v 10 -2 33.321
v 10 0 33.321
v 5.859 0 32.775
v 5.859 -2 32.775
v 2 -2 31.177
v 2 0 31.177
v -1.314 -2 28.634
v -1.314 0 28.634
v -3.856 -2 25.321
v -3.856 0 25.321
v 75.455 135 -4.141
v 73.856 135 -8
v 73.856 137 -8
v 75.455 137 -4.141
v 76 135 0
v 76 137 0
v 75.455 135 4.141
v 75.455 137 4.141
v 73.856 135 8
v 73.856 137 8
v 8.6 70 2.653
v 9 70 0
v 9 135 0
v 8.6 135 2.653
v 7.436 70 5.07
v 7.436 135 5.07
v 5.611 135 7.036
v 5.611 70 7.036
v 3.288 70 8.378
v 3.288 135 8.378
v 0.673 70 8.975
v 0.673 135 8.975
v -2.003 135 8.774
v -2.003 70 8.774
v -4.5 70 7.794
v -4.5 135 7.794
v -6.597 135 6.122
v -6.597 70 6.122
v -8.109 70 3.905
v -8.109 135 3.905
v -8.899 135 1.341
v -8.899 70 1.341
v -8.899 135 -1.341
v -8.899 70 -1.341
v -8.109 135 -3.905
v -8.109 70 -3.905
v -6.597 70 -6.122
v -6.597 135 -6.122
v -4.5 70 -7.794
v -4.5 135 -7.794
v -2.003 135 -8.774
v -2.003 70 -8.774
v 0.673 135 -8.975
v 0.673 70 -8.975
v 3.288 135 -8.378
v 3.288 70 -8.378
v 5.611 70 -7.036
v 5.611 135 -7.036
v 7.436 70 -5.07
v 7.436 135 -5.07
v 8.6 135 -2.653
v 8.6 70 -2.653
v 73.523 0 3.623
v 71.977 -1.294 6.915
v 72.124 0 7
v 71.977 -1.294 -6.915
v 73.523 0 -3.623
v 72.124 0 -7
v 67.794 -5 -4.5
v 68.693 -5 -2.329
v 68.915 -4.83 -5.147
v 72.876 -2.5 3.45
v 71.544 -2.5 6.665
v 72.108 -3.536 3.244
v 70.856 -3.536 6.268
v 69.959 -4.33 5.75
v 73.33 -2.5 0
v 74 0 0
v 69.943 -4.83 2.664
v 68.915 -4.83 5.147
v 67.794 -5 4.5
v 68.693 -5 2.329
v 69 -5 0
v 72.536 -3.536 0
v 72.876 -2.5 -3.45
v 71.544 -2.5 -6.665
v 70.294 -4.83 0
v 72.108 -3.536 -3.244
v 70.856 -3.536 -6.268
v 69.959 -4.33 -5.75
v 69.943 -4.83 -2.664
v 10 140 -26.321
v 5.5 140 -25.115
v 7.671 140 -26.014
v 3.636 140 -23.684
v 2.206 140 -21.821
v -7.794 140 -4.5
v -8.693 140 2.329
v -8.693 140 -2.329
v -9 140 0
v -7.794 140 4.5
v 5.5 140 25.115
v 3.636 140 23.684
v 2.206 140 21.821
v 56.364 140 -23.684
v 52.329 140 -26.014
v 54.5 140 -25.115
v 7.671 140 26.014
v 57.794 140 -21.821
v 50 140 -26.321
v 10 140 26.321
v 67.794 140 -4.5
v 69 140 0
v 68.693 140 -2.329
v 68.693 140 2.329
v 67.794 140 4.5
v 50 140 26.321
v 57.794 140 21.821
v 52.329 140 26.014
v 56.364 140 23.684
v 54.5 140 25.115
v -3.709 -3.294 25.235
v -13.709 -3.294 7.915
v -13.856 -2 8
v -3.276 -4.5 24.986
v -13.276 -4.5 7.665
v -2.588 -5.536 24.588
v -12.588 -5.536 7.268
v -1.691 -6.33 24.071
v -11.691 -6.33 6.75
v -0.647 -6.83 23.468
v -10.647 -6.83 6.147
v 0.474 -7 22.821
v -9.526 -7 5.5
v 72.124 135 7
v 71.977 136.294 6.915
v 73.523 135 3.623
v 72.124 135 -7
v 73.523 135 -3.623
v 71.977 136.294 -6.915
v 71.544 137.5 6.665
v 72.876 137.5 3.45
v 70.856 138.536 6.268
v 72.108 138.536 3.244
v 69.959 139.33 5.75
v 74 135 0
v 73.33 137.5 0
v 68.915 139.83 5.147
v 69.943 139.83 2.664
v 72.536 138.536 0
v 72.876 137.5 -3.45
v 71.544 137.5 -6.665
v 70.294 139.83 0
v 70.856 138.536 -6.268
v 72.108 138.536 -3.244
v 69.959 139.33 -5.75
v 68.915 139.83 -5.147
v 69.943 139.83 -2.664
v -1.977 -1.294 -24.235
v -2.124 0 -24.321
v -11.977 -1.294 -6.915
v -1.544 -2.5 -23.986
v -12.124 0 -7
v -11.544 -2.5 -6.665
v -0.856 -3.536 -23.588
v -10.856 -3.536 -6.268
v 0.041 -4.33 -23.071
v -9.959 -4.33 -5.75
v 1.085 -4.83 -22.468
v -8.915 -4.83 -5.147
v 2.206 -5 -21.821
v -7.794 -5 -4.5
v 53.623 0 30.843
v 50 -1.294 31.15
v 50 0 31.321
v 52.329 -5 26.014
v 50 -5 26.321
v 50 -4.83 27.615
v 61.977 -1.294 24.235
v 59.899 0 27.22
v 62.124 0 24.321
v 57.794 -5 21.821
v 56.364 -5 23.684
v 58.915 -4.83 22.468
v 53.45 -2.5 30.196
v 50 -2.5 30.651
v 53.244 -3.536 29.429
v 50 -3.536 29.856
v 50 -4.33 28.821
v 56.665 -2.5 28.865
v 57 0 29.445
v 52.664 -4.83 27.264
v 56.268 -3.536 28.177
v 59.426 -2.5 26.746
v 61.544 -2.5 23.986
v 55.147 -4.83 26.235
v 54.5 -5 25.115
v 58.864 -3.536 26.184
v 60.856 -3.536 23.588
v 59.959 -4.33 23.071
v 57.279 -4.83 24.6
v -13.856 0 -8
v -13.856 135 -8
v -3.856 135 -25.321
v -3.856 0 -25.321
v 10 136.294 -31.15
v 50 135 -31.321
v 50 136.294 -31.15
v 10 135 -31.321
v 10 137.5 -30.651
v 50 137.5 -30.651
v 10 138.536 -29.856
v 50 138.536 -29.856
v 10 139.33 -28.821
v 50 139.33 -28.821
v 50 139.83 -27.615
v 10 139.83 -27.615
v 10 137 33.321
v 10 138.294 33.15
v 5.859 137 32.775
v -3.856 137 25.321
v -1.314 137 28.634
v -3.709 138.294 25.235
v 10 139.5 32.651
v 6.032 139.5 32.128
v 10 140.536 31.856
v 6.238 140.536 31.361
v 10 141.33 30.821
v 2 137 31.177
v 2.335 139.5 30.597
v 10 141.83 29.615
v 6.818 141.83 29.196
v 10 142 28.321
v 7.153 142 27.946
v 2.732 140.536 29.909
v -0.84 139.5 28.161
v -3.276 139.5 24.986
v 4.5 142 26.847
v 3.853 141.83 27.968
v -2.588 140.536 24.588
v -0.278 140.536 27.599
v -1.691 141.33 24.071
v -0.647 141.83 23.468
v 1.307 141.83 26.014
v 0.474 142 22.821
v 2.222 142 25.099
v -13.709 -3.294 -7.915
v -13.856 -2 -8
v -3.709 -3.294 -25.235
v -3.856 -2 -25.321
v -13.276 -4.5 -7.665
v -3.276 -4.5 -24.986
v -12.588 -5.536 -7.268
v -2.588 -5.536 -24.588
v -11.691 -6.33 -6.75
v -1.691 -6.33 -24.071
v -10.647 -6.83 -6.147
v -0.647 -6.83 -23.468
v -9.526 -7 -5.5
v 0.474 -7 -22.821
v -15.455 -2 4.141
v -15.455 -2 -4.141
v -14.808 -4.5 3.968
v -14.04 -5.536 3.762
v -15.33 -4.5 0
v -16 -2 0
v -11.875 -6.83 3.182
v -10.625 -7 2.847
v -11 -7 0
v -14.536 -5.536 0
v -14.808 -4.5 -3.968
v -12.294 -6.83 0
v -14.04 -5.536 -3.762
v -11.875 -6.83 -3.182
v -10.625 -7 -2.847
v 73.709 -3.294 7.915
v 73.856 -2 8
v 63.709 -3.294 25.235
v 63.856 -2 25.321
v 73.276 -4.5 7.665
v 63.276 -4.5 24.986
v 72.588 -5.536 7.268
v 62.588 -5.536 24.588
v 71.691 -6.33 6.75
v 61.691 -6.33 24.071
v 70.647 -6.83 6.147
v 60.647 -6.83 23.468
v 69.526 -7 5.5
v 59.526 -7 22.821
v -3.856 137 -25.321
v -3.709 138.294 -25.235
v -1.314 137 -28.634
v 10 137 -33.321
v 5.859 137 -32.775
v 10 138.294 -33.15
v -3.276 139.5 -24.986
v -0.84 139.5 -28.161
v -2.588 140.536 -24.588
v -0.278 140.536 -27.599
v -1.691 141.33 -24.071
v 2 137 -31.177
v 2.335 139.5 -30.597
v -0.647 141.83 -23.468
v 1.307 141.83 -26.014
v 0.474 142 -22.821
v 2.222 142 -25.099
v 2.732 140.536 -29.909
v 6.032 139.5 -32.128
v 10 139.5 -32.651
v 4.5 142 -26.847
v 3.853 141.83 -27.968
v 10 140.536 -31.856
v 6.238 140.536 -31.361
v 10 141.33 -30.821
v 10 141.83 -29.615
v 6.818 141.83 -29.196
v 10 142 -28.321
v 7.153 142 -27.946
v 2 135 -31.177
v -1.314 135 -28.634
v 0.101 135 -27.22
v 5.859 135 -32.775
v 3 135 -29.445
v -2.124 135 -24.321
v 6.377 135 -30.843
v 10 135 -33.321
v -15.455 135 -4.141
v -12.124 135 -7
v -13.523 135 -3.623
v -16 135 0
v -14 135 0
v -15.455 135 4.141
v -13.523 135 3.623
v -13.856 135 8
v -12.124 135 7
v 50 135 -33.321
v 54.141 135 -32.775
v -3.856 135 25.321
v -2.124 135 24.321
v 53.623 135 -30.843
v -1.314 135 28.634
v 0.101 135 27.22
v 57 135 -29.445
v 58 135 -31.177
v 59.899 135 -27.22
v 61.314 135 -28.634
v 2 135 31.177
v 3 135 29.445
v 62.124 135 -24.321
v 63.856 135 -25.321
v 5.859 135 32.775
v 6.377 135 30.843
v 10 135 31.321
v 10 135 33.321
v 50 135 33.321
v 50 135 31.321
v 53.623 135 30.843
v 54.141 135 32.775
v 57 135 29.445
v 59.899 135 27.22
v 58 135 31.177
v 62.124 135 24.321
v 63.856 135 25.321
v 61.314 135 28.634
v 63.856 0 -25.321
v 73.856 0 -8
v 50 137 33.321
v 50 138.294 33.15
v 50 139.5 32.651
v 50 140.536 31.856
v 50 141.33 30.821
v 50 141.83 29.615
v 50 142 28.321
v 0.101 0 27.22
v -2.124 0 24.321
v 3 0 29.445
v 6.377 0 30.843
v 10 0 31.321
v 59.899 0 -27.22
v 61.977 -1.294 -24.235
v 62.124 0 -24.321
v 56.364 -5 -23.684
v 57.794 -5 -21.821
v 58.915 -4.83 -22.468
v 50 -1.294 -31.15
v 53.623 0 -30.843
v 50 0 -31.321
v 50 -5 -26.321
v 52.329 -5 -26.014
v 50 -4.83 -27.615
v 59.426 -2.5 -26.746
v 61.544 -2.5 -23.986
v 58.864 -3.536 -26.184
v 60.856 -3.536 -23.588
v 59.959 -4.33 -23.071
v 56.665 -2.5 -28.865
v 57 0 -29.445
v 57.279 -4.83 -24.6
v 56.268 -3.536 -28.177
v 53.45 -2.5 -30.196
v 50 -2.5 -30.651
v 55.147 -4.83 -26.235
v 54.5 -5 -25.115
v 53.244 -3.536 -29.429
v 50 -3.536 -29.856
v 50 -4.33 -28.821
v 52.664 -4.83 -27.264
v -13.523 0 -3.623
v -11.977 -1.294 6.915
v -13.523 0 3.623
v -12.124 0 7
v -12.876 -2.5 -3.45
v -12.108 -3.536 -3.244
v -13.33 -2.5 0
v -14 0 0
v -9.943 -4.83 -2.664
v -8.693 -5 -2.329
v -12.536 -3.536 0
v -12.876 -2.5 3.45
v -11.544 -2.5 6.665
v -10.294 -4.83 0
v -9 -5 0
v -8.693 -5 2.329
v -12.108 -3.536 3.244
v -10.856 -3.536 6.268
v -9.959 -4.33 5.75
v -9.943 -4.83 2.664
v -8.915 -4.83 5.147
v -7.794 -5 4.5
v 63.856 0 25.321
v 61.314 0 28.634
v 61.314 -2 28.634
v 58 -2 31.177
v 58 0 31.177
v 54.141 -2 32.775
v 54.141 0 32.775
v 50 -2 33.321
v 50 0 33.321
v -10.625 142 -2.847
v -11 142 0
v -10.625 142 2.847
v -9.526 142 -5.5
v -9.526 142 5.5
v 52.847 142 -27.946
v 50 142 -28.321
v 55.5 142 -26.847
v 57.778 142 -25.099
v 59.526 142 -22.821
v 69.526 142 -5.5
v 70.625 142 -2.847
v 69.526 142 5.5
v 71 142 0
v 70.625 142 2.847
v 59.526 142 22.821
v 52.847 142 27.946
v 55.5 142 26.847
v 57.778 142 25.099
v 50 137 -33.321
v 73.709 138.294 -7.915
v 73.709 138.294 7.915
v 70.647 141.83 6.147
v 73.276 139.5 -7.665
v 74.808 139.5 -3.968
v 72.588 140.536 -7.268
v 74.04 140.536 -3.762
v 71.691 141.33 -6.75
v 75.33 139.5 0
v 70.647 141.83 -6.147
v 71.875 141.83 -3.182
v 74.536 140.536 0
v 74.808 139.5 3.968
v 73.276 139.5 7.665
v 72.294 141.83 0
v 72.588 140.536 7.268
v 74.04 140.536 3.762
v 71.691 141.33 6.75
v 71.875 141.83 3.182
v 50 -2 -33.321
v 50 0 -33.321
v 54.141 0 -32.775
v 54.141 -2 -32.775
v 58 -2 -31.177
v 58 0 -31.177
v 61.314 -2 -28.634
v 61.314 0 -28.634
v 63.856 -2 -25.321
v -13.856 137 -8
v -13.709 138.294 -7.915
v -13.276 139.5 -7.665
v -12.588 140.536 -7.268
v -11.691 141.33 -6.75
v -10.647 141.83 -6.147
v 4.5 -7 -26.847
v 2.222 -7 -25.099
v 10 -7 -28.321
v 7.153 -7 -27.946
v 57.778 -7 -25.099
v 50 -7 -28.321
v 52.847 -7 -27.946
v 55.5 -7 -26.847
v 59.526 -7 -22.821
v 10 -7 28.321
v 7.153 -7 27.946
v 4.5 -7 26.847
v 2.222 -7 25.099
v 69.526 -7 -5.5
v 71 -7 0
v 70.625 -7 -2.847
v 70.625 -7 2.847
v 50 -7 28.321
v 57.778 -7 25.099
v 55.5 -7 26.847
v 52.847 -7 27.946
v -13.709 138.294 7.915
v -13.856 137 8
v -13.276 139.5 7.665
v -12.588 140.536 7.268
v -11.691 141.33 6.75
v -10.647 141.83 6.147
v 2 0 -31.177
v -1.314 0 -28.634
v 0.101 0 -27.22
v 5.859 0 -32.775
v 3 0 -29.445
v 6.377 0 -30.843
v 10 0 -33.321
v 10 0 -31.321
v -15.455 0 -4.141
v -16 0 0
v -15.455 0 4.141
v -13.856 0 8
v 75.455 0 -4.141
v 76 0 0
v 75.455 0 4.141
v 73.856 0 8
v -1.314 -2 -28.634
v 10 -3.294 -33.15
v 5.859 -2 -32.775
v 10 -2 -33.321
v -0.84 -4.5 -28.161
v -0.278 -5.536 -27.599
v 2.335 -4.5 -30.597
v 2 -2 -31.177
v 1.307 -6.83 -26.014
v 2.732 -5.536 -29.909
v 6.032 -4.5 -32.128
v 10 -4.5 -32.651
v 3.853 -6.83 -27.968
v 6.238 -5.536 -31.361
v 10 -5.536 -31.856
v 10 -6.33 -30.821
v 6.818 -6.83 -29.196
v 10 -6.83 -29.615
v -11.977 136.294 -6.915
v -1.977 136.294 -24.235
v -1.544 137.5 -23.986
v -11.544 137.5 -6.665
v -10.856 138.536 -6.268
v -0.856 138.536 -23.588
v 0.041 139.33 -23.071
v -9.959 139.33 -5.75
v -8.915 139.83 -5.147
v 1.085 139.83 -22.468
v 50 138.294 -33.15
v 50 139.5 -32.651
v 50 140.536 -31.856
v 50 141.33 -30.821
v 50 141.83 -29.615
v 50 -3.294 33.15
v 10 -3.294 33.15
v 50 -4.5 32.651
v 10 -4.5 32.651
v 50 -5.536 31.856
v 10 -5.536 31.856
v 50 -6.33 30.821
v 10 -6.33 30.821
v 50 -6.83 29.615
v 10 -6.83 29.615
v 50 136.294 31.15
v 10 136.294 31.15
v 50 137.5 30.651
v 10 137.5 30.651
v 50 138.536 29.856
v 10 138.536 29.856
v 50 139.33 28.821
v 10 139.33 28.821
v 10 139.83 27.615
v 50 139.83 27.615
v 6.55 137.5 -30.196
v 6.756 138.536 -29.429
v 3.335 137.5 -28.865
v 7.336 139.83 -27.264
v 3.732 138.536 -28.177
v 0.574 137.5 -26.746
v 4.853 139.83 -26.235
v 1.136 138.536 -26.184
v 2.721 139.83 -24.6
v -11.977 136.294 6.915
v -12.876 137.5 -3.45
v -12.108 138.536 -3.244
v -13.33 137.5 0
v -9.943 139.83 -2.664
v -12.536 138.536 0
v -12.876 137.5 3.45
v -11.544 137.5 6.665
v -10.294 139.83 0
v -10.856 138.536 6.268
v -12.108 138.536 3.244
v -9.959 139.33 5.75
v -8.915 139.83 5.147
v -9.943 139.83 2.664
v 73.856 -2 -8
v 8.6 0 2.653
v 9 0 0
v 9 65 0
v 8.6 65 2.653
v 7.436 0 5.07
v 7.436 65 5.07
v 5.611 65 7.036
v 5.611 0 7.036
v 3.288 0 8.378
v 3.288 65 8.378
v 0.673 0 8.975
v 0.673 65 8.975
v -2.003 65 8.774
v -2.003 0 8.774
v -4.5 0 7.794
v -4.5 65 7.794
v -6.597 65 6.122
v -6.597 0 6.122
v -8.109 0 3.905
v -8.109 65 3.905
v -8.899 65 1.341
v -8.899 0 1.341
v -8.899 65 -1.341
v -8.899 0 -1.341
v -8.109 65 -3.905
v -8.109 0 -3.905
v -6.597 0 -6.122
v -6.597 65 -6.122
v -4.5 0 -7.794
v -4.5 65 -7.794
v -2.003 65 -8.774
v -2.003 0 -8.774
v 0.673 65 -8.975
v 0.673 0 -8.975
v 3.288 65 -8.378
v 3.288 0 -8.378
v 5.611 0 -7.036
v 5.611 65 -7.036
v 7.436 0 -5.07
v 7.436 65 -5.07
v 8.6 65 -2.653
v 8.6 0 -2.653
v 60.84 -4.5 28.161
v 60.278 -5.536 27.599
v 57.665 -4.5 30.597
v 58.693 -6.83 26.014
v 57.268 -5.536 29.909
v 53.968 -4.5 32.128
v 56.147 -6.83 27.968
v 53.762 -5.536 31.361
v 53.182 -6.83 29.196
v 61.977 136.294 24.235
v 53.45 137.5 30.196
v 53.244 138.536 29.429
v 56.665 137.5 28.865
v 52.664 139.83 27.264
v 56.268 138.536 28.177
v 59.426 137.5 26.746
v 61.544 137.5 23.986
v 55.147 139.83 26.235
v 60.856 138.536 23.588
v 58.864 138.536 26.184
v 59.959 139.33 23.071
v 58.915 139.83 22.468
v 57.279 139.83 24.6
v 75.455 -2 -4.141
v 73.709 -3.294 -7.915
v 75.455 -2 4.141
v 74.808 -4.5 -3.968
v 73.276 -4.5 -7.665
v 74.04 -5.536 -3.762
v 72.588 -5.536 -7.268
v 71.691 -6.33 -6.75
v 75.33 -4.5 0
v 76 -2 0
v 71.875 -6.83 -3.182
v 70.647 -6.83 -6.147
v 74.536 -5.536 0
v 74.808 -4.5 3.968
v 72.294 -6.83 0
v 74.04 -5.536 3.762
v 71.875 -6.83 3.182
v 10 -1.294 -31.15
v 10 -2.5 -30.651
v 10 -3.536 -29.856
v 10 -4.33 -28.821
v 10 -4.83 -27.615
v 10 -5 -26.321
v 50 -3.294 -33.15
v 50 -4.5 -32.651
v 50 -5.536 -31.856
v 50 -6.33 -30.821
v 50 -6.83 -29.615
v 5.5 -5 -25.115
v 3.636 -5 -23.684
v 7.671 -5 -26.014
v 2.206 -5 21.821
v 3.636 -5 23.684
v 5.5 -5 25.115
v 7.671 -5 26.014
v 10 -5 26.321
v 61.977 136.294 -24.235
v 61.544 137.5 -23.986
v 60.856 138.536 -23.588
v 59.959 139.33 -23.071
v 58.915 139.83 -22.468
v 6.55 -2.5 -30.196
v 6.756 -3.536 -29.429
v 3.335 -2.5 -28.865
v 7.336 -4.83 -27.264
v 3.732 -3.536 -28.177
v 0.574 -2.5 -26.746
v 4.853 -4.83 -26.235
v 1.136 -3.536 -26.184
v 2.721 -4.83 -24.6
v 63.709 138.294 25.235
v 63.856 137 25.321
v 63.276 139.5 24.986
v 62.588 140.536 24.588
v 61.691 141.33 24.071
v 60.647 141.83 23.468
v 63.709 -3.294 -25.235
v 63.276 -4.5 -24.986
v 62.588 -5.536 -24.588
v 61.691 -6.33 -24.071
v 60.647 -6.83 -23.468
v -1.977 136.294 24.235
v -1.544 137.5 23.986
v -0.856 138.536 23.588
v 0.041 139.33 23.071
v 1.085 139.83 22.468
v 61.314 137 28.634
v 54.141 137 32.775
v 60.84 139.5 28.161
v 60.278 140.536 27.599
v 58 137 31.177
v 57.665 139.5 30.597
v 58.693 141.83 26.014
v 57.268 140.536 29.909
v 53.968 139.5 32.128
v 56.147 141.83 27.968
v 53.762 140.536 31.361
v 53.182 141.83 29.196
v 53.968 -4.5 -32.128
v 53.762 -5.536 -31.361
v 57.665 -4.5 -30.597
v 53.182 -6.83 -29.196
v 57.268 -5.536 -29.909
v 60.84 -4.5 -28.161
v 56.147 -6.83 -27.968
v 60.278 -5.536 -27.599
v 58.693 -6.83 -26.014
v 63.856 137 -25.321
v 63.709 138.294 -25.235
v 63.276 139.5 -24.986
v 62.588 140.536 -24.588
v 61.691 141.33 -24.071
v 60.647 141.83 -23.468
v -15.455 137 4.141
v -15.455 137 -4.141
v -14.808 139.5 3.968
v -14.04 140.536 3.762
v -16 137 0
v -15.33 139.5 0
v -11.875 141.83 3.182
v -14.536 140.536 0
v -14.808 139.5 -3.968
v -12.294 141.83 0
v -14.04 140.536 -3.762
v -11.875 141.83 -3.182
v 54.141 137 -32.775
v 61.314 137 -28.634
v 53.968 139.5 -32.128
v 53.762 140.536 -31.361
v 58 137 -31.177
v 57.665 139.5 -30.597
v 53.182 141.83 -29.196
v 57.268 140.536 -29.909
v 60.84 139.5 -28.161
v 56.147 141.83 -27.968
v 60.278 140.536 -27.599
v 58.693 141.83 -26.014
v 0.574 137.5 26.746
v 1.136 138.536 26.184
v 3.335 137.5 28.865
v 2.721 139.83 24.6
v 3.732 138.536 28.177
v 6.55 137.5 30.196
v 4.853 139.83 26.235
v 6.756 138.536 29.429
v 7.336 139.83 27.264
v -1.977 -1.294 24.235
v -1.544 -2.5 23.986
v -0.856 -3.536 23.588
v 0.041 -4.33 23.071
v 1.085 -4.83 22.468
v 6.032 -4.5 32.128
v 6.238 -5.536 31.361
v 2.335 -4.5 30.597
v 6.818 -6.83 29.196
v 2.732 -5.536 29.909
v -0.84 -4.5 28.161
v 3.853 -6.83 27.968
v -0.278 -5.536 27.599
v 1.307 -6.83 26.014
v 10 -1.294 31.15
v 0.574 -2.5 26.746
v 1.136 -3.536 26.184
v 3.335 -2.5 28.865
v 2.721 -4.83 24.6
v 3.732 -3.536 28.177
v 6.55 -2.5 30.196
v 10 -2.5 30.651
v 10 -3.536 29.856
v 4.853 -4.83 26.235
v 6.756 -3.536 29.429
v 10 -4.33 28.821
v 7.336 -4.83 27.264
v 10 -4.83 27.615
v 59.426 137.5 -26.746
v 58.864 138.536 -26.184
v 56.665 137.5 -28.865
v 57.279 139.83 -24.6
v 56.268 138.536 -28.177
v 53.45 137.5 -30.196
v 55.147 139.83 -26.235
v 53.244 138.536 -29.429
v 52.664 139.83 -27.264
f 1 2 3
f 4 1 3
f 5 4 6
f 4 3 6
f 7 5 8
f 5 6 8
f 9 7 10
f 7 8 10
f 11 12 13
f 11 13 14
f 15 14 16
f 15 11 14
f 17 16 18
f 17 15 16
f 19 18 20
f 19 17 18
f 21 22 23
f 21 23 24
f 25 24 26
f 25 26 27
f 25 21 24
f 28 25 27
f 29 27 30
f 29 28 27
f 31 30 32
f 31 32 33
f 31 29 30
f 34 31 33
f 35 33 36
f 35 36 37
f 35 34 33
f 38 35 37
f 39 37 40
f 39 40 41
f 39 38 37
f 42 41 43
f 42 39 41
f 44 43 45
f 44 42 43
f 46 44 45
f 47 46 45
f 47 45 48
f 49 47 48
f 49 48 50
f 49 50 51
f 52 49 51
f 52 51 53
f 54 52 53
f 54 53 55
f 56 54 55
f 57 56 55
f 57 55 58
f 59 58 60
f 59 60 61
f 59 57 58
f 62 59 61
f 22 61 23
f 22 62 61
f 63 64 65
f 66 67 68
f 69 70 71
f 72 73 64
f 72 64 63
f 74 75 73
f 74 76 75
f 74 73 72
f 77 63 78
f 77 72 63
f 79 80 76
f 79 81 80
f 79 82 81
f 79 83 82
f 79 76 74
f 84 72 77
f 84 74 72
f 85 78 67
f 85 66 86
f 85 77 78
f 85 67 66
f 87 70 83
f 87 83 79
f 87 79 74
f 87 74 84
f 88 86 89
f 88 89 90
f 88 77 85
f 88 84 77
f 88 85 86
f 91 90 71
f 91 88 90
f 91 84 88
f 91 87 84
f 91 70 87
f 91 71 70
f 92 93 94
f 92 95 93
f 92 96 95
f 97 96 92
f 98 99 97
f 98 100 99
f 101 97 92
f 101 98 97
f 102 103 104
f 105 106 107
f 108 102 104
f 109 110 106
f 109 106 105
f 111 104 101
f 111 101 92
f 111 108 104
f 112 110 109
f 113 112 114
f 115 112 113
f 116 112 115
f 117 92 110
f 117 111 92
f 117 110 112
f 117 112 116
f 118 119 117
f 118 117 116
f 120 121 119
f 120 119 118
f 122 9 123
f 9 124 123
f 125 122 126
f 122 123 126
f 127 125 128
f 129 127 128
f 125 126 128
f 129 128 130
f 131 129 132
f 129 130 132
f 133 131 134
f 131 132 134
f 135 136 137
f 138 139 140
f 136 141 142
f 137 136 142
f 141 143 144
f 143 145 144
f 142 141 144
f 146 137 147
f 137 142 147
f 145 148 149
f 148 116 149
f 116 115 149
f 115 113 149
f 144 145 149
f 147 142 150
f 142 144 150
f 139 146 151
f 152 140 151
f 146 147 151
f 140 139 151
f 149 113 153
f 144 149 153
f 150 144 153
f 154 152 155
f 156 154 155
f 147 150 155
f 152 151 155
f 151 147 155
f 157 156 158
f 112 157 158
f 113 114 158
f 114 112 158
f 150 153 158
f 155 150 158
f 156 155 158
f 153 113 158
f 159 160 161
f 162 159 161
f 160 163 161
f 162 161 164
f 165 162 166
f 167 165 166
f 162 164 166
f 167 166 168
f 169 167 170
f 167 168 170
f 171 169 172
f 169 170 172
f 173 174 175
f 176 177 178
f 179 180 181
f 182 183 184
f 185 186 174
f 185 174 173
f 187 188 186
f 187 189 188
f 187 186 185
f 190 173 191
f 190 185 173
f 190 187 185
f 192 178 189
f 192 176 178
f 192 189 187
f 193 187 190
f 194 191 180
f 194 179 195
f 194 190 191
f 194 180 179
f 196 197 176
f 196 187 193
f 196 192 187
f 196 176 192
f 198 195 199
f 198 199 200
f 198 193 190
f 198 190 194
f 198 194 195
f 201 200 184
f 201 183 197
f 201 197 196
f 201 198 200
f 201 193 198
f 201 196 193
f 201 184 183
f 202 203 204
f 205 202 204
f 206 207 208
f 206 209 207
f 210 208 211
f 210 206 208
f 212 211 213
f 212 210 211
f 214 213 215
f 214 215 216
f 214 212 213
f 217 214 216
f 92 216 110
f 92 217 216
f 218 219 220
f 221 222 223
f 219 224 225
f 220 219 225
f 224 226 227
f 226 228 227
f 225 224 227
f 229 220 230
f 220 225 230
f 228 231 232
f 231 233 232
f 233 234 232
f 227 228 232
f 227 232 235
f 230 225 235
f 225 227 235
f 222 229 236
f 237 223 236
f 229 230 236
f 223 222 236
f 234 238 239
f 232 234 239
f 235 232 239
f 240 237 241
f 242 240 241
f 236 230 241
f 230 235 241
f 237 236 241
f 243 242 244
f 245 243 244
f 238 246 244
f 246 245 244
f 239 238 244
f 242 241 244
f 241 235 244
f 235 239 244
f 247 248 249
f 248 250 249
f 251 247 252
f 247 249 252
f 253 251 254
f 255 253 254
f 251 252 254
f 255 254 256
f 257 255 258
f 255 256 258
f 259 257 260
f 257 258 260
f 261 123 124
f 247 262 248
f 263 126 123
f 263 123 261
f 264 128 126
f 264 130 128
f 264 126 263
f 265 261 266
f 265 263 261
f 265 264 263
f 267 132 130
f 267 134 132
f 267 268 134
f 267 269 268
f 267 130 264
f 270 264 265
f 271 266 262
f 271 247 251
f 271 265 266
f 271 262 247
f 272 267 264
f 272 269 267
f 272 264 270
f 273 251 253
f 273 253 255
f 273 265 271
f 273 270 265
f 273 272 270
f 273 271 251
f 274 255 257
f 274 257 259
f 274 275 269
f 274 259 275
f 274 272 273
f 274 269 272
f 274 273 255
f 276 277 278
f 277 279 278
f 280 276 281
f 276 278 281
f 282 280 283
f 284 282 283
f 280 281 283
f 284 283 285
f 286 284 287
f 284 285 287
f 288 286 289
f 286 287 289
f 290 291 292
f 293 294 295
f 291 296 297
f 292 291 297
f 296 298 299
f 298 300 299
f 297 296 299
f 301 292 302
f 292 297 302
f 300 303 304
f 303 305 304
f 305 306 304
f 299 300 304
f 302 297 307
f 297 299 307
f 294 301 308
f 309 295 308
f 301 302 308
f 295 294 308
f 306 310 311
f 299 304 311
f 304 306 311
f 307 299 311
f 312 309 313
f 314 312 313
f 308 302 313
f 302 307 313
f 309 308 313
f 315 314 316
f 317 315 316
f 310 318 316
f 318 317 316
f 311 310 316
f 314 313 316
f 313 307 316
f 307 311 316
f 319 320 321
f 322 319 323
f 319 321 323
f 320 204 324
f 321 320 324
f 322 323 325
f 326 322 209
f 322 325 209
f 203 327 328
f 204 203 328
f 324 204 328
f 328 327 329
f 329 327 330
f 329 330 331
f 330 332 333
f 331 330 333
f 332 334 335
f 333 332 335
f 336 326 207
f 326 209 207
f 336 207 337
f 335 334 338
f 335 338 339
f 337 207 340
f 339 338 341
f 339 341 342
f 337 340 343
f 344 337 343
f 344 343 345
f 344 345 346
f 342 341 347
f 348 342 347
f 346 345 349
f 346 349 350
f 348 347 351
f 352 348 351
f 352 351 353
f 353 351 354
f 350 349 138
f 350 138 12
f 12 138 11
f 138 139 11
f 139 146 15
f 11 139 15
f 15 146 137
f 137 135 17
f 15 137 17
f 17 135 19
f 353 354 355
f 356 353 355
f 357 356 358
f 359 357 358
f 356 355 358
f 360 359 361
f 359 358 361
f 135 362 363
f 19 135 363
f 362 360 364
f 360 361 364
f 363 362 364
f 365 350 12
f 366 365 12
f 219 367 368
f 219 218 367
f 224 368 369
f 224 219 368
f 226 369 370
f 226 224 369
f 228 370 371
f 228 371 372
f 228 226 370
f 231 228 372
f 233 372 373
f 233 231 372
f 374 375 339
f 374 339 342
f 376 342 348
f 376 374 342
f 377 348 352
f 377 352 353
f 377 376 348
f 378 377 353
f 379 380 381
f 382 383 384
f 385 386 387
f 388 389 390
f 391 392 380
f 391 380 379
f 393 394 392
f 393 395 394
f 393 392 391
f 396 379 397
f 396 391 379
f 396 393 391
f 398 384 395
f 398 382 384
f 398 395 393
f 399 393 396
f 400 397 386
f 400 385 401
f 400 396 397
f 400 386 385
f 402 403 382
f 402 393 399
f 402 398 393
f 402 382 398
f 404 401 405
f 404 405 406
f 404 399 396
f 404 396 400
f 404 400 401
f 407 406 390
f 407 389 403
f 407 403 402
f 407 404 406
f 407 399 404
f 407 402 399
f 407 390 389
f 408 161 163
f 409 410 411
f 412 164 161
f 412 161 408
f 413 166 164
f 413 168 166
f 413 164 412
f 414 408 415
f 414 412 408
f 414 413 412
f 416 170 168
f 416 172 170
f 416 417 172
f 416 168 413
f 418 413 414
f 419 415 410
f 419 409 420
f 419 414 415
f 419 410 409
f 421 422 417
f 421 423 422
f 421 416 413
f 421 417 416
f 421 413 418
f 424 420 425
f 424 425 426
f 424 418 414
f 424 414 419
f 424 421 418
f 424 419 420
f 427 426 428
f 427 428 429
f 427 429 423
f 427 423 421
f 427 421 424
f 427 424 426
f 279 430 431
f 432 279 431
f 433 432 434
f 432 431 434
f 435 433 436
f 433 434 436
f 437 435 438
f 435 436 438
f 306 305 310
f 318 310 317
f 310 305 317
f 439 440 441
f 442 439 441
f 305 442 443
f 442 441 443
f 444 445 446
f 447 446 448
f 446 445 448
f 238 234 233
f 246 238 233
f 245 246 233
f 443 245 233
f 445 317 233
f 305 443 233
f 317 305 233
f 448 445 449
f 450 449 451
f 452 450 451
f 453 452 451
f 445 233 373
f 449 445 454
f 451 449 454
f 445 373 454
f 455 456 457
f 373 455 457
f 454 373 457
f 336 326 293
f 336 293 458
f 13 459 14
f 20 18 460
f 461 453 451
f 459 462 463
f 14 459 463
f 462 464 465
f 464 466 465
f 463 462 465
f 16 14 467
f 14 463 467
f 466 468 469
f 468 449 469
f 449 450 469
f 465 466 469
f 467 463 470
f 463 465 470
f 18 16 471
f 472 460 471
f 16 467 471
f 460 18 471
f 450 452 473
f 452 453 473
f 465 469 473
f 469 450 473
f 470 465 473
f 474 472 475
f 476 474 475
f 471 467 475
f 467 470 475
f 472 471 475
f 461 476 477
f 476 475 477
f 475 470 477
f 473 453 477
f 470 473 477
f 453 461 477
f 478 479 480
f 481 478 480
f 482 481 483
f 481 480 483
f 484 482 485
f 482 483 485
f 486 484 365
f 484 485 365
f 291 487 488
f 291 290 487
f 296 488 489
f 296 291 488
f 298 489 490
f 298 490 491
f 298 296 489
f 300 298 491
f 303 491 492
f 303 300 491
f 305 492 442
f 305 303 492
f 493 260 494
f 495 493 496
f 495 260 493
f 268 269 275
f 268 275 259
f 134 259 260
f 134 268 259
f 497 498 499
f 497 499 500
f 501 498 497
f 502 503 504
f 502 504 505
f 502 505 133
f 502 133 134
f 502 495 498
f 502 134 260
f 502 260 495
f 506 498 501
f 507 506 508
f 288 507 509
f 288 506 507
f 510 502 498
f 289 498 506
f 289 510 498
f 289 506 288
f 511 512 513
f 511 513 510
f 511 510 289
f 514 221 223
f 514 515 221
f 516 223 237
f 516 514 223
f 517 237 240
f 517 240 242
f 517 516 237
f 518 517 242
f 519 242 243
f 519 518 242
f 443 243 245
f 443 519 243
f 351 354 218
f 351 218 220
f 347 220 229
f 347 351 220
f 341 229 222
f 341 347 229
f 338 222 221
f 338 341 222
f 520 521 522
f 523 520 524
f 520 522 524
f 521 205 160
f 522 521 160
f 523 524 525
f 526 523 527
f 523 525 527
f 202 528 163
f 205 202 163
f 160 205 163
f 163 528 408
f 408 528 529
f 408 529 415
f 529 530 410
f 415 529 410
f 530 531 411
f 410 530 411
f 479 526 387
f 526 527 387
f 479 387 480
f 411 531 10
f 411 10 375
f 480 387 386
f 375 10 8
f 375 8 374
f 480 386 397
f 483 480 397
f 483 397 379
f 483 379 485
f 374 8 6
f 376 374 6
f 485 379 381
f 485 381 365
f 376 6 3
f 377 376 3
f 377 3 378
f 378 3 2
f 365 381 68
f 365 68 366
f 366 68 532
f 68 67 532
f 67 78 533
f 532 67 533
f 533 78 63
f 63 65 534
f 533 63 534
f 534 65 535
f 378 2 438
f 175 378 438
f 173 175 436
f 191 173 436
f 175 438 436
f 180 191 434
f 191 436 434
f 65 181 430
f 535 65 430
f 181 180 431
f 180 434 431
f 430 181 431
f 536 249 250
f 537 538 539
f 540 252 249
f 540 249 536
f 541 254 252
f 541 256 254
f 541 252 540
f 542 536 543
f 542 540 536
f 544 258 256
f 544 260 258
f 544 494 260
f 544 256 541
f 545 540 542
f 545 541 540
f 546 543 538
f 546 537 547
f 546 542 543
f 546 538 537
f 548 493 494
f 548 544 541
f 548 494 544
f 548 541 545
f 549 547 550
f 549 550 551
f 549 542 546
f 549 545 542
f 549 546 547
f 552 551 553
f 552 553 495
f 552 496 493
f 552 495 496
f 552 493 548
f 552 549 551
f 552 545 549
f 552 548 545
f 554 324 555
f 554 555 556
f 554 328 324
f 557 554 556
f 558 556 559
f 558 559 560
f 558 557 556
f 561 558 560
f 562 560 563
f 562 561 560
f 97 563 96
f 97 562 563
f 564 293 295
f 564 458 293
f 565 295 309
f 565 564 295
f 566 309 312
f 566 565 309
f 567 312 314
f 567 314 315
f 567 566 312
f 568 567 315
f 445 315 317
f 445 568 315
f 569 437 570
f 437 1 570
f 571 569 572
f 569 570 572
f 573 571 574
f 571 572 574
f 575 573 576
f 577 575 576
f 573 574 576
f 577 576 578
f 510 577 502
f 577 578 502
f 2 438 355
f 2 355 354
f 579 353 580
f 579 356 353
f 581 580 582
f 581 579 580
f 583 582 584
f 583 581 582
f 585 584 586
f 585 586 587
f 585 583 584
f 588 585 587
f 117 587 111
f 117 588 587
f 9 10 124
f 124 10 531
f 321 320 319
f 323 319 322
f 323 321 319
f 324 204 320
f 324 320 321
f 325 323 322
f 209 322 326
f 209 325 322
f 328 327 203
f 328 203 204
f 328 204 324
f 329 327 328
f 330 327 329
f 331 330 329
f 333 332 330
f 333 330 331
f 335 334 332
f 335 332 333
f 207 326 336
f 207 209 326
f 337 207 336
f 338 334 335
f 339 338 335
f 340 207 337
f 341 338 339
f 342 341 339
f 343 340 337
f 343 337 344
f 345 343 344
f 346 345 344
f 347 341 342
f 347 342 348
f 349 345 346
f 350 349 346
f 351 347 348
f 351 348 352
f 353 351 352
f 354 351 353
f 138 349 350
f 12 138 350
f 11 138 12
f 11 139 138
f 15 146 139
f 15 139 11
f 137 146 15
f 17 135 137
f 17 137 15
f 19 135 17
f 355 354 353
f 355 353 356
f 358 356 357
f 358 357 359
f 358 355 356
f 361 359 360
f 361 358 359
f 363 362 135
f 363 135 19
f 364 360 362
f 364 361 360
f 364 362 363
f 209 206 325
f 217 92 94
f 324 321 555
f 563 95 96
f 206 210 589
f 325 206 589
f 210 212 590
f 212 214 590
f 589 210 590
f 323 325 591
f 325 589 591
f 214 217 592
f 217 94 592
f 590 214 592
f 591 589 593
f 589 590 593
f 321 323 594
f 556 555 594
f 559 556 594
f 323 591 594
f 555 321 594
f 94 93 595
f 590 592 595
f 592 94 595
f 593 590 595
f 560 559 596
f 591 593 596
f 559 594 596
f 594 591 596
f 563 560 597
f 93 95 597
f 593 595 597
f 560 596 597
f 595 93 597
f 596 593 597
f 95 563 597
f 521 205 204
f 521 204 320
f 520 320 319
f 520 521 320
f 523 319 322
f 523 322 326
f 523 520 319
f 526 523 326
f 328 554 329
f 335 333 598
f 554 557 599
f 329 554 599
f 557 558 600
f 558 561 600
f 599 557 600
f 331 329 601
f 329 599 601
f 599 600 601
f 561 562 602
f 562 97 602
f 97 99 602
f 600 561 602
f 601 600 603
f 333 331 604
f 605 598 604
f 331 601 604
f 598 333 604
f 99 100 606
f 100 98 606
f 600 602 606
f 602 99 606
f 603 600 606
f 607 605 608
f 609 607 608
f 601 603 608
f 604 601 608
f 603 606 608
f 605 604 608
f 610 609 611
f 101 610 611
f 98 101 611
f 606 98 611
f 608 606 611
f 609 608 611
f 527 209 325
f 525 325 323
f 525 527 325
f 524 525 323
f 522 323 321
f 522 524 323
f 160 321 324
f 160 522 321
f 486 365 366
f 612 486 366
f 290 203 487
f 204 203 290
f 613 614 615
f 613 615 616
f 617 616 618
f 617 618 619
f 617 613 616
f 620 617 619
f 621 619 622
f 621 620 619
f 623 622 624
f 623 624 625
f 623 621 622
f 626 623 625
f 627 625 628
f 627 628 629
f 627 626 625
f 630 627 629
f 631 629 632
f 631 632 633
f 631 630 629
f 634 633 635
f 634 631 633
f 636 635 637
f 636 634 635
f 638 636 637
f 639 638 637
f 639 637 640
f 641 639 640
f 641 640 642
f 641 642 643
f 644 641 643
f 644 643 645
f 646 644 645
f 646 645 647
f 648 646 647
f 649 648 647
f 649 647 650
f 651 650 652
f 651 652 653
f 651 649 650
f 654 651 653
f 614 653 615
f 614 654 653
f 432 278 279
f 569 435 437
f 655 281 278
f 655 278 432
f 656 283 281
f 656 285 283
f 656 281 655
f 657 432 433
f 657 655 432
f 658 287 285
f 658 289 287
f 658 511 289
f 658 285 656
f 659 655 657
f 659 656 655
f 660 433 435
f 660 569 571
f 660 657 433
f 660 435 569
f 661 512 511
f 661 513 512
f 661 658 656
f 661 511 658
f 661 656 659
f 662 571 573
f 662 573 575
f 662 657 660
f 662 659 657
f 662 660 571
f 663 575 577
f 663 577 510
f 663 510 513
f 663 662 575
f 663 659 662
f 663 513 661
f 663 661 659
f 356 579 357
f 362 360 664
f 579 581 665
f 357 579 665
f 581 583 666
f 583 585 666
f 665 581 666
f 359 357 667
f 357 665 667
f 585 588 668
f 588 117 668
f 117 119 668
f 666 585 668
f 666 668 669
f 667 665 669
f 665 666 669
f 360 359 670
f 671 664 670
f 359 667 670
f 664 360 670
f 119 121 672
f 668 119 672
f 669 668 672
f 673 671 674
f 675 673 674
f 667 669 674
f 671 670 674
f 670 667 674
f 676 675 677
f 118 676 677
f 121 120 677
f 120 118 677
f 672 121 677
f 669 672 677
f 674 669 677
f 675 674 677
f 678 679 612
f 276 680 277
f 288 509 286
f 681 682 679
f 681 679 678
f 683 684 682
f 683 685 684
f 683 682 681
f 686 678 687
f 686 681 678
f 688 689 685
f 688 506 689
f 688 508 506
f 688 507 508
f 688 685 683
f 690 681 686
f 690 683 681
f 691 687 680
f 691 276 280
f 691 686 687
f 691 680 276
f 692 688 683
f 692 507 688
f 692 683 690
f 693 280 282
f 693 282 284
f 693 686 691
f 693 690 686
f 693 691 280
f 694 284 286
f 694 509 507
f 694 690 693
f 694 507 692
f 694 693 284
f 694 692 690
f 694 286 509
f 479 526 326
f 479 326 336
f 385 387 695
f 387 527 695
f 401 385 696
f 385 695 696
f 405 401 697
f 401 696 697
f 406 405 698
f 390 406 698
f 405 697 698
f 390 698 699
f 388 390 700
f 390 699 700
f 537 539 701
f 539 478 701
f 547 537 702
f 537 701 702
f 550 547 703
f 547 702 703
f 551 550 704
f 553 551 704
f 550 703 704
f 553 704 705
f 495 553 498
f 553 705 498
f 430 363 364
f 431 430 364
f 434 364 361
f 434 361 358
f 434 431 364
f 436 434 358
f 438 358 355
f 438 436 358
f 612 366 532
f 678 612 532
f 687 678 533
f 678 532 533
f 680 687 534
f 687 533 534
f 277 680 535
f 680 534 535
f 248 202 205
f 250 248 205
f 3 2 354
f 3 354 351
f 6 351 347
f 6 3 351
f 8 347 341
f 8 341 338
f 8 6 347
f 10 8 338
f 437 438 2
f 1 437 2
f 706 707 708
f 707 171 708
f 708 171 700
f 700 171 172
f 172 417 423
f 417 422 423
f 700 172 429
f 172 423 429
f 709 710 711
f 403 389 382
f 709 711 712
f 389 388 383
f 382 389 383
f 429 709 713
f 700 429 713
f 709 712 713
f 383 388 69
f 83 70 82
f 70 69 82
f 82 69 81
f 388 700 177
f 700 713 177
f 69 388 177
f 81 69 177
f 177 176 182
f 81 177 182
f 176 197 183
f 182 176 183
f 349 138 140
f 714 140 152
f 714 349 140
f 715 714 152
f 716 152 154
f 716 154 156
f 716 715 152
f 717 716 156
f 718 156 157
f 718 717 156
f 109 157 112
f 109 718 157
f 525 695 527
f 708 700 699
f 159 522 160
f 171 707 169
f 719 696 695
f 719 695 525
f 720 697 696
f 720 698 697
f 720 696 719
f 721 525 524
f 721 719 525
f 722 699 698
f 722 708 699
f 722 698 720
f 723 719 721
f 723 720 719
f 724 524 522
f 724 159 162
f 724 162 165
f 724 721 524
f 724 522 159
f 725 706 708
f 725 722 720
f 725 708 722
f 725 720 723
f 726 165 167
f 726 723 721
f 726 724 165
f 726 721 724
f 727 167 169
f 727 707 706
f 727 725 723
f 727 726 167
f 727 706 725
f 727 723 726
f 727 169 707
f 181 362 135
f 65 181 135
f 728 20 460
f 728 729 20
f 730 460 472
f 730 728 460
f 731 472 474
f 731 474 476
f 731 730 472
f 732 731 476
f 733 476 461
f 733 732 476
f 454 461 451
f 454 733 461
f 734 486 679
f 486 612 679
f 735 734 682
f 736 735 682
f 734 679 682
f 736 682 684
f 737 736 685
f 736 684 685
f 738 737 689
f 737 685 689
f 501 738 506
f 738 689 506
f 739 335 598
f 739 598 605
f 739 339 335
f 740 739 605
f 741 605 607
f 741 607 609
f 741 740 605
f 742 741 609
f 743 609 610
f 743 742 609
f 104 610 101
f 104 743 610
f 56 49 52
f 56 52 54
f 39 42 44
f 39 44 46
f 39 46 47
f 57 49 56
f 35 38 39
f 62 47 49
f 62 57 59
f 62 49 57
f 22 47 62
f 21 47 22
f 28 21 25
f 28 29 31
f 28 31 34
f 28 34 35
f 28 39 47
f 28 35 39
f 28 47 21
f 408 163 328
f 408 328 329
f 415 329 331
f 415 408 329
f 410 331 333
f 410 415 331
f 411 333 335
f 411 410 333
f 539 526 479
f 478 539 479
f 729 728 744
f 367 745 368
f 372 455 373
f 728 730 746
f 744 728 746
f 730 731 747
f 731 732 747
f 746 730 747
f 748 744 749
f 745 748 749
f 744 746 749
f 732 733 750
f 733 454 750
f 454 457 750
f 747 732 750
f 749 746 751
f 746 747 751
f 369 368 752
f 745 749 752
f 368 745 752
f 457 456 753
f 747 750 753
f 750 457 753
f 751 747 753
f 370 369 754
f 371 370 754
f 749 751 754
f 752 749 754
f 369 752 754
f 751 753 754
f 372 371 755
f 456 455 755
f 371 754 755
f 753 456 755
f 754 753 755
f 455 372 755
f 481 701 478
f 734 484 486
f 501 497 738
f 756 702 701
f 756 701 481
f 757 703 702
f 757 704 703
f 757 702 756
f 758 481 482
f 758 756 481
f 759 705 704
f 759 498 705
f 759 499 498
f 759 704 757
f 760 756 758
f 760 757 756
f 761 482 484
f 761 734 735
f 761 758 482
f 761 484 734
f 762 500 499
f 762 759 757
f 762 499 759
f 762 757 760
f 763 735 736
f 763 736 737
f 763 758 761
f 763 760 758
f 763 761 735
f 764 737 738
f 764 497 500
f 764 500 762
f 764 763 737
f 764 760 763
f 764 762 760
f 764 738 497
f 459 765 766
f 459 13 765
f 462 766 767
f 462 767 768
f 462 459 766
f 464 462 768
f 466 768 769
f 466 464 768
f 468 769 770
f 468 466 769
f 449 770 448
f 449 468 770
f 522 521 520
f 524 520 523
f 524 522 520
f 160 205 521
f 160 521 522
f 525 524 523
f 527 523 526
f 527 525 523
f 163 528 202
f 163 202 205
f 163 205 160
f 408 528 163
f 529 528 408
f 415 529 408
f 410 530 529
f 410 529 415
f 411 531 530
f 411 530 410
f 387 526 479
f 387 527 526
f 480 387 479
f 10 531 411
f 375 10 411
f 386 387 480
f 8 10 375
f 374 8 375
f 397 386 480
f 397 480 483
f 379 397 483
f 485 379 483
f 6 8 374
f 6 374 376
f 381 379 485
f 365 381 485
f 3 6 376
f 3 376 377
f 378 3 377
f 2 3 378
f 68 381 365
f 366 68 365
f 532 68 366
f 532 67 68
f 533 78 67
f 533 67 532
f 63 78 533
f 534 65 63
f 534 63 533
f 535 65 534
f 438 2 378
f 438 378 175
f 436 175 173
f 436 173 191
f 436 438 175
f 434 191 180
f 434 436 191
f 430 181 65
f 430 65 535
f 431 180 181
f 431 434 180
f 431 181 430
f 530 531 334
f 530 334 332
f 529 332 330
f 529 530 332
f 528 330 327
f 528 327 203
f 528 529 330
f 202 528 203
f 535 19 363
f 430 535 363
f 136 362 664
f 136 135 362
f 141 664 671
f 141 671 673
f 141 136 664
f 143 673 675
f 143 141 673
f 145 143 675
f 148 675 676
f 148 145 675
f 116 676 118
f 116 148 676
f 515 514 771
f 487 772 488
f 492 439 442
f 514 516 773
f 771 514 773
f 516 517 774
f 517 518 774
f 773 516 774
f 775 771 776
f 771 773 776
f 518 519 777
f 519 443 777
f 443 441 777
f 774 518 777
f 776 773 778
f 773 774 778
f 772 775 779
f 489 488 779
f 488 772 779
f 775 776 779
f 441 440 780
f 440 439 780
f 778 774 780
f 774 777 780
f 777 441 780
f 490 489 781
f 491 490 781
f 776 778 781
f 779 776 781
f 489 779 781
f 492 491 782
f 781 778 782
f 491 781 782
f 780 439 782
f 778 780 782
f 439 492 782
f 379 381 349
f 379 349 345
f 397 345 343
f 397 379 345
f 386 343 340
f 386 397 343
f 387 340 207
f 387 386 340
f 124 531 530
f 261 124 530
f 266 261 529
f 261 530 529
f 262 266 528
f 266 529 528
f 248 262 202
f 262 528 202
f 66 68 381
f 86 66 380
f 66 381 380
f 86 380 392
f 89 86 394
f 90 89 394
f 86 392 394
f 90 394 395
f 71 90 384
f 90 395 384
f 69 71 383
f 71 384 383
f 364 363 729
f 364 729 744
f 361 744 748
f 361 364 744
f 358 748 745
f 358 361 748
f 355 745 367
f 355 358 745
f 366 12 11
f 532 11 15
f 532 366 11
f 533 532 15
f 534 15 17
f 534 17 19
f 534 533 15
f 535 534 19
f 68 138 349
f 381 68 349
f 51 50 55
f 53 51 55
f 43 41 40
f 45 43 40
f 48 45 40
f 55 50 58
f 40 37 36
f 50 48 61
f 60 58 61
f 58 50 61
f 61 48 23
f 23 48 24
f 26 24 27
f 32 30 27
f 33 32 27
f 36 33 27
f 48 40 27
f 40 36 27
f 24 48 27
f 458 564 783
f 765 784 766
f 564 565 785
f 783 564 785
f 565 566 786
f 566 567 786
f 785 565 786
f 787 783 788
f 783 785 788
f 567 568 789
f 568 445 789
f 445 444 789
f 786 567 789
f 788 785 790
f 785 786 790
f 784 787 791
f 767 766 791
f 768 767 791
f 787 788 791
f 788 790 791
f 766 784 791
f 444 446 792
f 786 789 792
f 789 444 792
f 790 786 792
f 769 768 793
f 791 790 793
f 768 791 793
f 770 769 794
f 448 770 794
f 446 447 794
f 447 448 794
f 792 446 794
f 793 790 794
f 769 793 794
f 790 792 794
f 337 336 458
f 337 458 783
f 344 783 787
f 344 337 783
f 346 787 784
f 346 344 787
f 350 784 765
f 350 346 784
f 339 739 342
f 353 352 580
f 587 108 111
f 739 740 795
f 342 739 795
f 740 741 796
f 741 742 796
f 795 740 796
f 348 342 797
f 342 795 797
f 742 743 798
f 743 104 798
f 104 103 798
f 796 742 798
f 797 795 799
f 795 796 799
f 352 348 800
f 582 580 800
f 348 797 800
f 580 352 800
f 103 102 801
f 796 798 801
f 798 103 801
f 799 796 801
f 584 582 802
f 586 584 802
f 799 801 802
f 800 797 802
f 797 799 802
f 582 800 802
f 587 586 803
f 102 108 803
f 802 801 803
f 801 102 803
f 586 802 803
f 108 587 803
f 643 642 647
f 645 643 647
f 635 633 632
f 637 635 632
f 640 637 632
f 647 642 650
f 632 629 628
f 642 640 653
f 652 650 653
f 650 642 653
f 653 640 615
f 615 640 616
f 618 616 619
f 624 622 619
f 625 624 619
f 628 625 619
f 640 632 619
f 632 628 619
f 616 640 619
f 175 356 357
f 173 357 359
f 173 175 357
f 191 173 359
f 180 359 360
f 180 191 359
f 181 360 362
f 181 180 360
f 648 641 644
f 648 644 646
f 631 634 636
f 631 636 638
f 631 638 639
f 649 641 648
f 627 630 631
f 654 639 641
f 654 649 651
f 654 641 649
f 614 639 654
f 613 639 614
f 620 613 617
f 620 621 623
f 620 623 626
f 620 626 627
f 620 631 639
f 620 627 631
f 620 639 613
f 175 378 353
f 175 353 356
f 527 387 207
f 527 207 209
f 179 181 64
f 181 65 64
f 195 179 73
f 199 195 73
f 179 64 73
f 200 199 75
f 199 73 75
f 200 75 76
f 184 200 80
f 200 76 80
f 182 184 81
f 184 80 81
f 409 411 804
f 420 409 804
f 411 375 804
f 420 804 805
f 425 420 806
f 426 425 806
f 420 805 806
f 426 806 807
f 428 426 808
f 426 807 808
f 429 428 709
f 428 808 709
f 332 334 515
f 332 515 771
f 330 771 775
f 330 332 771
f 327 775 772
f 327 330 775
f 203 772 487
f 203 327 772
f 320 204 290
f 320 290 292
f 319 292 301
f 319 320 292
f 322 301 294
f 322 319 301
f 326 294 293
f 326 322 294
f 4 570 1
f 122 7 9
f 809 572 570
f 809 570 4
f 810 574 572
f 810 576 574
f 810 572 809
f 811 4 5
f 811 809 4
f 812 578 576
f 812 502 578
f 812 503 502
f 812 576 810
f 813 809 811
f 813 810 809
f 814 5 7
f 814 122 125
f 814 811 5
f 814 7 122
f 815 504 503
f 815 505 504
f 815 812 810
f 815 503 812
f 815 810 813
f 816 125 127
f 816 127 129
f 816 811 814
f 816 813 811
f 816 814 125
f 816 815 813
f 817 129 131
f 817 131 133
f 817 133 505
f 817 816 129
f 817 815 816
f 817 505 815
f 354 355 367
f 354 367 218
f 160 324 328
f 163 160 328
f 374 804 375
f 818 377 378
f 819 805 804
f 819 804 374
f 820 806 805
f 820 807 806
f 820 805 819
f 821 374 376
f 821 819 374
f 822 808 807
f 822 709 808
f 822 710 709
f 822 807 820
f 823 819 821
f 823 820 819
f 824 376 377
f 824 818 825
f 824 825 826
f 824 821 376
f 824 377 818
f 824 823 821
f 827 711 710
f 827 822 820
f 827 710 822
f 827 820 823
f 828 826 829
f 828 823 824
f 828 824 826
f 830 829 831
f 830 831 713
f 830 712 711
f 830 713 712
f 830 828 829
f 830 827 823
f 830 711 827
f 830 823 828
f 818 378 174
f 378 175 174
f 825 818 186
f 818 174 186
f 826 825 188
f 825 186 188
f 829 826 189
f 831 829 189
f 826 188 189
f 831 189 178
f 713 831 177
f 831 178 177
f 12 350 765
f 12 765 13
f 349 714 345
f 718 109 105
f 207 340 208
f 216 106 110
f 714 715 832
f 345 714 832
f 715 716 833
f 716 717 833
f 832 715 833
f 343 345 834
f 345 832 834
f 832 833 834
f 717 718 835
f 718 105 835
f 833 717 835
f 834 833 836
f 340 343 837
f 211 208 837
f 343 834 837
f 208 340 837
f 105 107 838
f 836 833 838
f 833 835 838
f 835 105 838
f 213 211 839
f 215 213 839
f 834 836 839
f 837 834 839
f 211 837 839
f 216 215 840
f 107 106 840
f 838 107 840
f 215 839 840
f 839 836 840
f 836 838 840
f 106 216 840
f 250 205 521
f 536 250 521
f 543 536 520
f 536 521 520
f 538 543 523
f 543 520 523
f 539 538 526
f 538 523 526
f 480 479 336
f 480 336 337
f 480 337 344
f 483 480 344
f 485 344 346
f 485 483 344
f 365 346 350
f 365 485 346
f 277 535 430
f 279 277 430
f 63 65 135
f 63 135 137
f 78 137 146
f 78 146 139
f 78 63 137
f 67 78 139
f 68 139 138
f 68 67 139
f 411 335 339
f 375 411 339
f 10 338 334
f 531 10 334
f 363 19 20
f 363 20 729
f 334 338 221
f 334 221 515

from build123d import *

# Parameters (mm, degrees)
F0_R      = 9
F4_DEPTH  = 65
F3_R      = 9
F5_DEPTH  = 65
F6_DEPTH  = 135
F8_DEPTH  = 5
F10_DEPTH = 2
F11_R     = 5
F12_R     = 4.99999


# Not quite as in the source:
# - a fillet or chamfer is up to 0.001 mm smaller than in the source, because OpenCascade refuses the exact size


with BuildPart() as f4:
    # F0 (on Front) → F4 (new body)
    with BuildSketch(Plane.XZ):
        Circle(F0_R)
    extrude(amount=-F4_DEPTH)


with BuildPart() as f5:
    # F3 (on offset) → F5 (new body)
    with BuildSketch(Plane.XZ.offset(-70)):
        Circle(F3_R)
    extrude(amount=-F5_DEPTH)


with BuildPart() as f6:
    # F1 (on Front) → F6 (new body)
    with BuildSketch(Plane.XZ):
        with BuildLine():
            Line((50, 33.3205080757), (10, 33.3205080757))
            ThreePointArc((10, 33.3205080757), (2, 31.1769145362), (-3.8564064606, 25.3205080757))
            Line((-3.8564064606, 25.3205080757), (-13.8564064606, 8))
            ThreePointArc((-13.8564064606, 8), (-16, 0), (-13.8564064606, -8))
            Line((-13.8564064606, -8), (-3.8564064606, -25.3205080757))
            ThreePointArc((-3.8564064606, -25.3205080757), (2, -31.1769145362), (10, -33.3205080757))
            Line((10, -33.3205080757), (50, -33.3205080757))
            ThreePointArc((50, -33.3205080757), (58, -31.1769145362), (63.8564064606, -25.3205080757))
            Line((63.8564064606, -25.3205080757), (73.8564064606, -8))
            ThreePointArc((73.8564064606, -8), (76, 0), (73.8564064606, 8))
            Line((73.8564064606, 8), (63.8564064606, 25.3205080757))
            ThreePointArc((63.8564064606, 25.3205080757), (58, 31.1769145362), (50, 33.3205080757))
        make_face()
        with BuildLine():
            ThreePointArc((-2.124355653, 24.3205080757), (3, 29.4448637287), (10, 31.3205080757))
            Line((10, 31.3205080757), (50, 31.3205080757))
            ThreePointArc((50, 31.3205080757), (57, 29.4448637287), (62.124355653, 24.3205080757))
            Line((62.124355653, 24.3205080757), (72.124355653, 7))
            ThreePointArc((72.124355653, 7), (74, 0), (72.124355653, -7))
            Line((72.124355653, -7), (62.124355653, -24.3205080757))
            ThreePointArc((62.124355653, -24.3205080757), (57, -29.4448637287), (50, -31.3205080757))
            Line((50, -31.3205080757), (10, -31.3205080757))
            ThreePointArc((10, -31.3205080757), (3, -29.4448637287), (-2.124355653, -24.3205080757))
            Line((-2.124355653, -24.3205080757), (-12.124355653, -7))
            ThreePointArc((-12.124355653, -7), (-14, 0), (-12.124355653, 7))
            Line((-12.124355653, 7), (-2.124355653, 24.3205080757))
        make_face(mode=Mode.SUBTRACT)
    extrude(amount=-F6_DEPTH)


with BuildPart() as f8:
    # F7 (on face) → F8 (new body)
    with BuildSketch(Plane.XZ):
        with BuildLine():
            ThreePointArc((-3.8564064606, -25.3205080757), (2, -31.1769145362), (10, -33.3205080757))
            Line((10, -33.3205080757), (50, -33.3205080757))
            ThreePointArc((50, -33.3205080757), (58, -31.1769145362), (63.8564064606, -25.3205080757))
            Line((63.8564064606, -25.3205080757), (73.8564064606, -8))
            ThreePointArc((73.8564064606, -8), (76, 0), (73.8564064606, 8))
            Line((73.8564064606, 8), (63.8564064606, 25.3205080757))
            ThreePointArc((63.8564064606, 25.3205080757), (58, 31.1769145362), (50, 33.3205080757))
            Line((50, 33.3205080757), (10, 33.3205080757))
            ThreePointArc((10, 33.3205080757), (2, 31.1769145362), (-3.8564064606, 25.3205080757))
            Line((-3.8564064606, 25.3205080757), (-13.8564064606, 8))
            ThreePointArc((-13.8564064606, 8), (-16, 0), (-13.8564064606, -8))
            Line((-13.8564064606, -8), (-3.8564064606, -25.3205080757))
        make_face()
        with BuildLine():
            ThreePointArc((-2.124355653, 24.3205080757), (3, 29.4448637287), (10, 31.3205080757))
            Line((10, 31.3205080757), (50, 31.3205080757))
            ThreePointArc((50, 31.3205080757), (57, 29.4448637287), (62.124355653, 24.3205080757))
            Line((62.124355653, 24.3205080757), (72.124355653, 7))
            ThreePointArc((72.124355653, 7), (74, 0), (72.124355653, -7))
            Line((72.124355653, -7), (62.124355653, -24.3205080757))
            ThreePointArc((62.124355653, -24.3205080757), (57, -29.4448637287), (50, -31.3205080757))
            Line((50, -31.3205080757), (10, -31.3205080757))
            ThreePointArc((10, -31.3205080757), (3, -29.4448637287), (-2.124355653, -24.3205080757))
            Line((-2.124355653, -24.3205080757), (-12.124355653, -7))
            ThreePointArc((-12.124355653, -7), (-14, 0), (-12.124355653, 7))
            Line((-12.124355653, 7), (-2.124355653, 24.3205080757))
        make_face(mode=Mode.SUBTRACT)
    extrude(amount=F8_DEPTH)

    # F9 (on face) → F10 (join)
    with BuildSketch(Plane.XZ.offset(5)):
        with BuildLine():
            Line((-13.8564064606, -8), (-3.8564064606, -25.3205080757))
            ThreePointArc((-3.8564064606, -25.3205080757), (2, -31.1769145362), (10, -33.3205080757))
            Line((10, -33.3205080757), (50, -33.3205080757))
            ThreePointArc((50, -33.3205080757), (58, -31.1769145362), (63.8564064606, -25.3205080757))
            Line((63.8564064606, -25.3205080757), (73.8564064606, -8))
            ThreePointArc((73.8564064606, -8), (76, 0), (73.8564064606, 8))
            Line((73.8564064606, 8), (63.8564064606, 25.3205080757))
            ThreePointArc((63.8564064606, 25.3205080757), (58, 31.1769145362), (50, 33.3205080757))
            Line((50, 33.3205080757), (10, 33.3205080757))
            ThreePointArc((10, 33.3205080757), (2, 31.1769145362), (-3.8564064606, 25.3205080757))
            Line((-3.8564064606, 25.3205080757), (-13.8564064606, 8))
            ThreePointArc((-13.8564064606, 8), (-16, 0), (-13.8564064606, -8))
        make_face()
        with BuildLine():
            Line((-12.124355653, 7), (-2.124355653, 24.3205080757))
            ThreePointArc((-2.124355653, 24.3205080757), (3, 29.4448637287), (10, 31.3205080757))
            Line((10, 31.3205080757), (50, 31.3205080757))
            ThreePointArc((50, 31.3205080757), (57, 29.4448637287), (62.124355653, 24.3205080757))
            Line((62.124355653, 24.3205080757), (72.124355653, 7))
            ThreePointArc((72.124355653, 7), (74, 0), (72.124355653, -7))
            Line((72.124355653, -7), (62.124355653, -24.3205080757))
            ThreePointArc((62.124355653, -24.3205080757), (57, -29.4448637287), (50, -31.3205080757))
            Line((50, -31.3205080757), (10, -31.3205080757))
            ThreePointArc((10, -31.3205080757), (3, -29.4448637287), (-2.124355653, -24.3205080757))
            Line((-2.124355653, -24.3205080757), (-12.124355653, -7))
            ThreePointArc((-12.124355653, -7), (-14, 0), (-12.124355653, 7))
        make_face(mode=Mode.SUBTRACT)
        with BuildLine():
            ThreePointArc((10, 31.3205080757), (3, 29.4448637287), (-2.124355653, 24.3205080757))
            Line((-2.124355653, 24.3205080757), (-12.124355653, 7))
            ThreePointArc((-12.124355653, 7), (-14, 0), (-12.124355653, -7))
            Line((-12.124355653, -7), (-2.124355653, -24.3205080757))
            ThreePointArc((-2.124355653, -24.3205080757), (3, -29.4448637287), (10, -31.3205080757))
            Line((10, -31.3205080757), (50, -31.3205080757))
            ThreePointArc((50, -31.3205080757), (57, -29.4448637287), (62.124355653, -24.3205080757))
            Line((62.124355653, -24.3205080757), (72.124355653, -7))
            ThreePointArc((72.124355653, -7), (74, 0), (72.124355653, 7))
            Line((72.124355653, 7), (62.124355653, 24.3205080757))
            ThreePointArc((62.124355653, 24.3205080757), (57, 29.4448637287), (50, 31.3205080757))
            Line((50, 31.3205080757), (10, 31.3205080757))
        make_face()
    extrude(amount=F10_DEPTH)

    # F11
    f11_edges = [f8.edges().sort_by_distance(p)[0] for p in [
        (2, -7, 31.176915),
        (-8.856406, -7, 16.660254),
        (-16, -7, 0),
        (-8.856406, -7, -16.660254),
        (2, -7, -31.176915),
        (30, -7, -33.320508),
        (58, -7, -31.176915),
        (68.856406, -7, -16.660254),
        (76, -7, 0),
        (68.856406, -7, 16.660254),
        (58, -7, 31.176915),
        (30, -7, 33.320508),
    ]]
    fillet(f11_edges, radius=F11_R)

    # F12 (radius 5 in the source; OpenCascade refuses exactly that, so slightly less here)
    f12_edges = [f8.edges().sort_by_distance(p)[0] for p in [
        (3, -5, 29.444864),
        (30, -5, 31.320508),
        (57, -5, 29.444864),
        (67.124356, -5, 15.660254),
        (74, -5, 0),
        (67.124356, -5, -15.660254),
        (57, -5, -29.444864),
        (30, -5, -31.320508),
        (3, -5, -29.444864),
        (-7.124356, -5, -15.660254),
        (-14, -5, 0),
        (-7.124356, -5, 15.660254),
    ]]
    fillet(f12_edges, radius=F12_R)


with BuildPart() as f14_1:
    # F14: instance of F8
    add(f8.part.mirror(Plane.XZ.offset(-67.5)))


solid = Compound([f4.part, f5.part, f6.part, f8.part, f14_1.part])
